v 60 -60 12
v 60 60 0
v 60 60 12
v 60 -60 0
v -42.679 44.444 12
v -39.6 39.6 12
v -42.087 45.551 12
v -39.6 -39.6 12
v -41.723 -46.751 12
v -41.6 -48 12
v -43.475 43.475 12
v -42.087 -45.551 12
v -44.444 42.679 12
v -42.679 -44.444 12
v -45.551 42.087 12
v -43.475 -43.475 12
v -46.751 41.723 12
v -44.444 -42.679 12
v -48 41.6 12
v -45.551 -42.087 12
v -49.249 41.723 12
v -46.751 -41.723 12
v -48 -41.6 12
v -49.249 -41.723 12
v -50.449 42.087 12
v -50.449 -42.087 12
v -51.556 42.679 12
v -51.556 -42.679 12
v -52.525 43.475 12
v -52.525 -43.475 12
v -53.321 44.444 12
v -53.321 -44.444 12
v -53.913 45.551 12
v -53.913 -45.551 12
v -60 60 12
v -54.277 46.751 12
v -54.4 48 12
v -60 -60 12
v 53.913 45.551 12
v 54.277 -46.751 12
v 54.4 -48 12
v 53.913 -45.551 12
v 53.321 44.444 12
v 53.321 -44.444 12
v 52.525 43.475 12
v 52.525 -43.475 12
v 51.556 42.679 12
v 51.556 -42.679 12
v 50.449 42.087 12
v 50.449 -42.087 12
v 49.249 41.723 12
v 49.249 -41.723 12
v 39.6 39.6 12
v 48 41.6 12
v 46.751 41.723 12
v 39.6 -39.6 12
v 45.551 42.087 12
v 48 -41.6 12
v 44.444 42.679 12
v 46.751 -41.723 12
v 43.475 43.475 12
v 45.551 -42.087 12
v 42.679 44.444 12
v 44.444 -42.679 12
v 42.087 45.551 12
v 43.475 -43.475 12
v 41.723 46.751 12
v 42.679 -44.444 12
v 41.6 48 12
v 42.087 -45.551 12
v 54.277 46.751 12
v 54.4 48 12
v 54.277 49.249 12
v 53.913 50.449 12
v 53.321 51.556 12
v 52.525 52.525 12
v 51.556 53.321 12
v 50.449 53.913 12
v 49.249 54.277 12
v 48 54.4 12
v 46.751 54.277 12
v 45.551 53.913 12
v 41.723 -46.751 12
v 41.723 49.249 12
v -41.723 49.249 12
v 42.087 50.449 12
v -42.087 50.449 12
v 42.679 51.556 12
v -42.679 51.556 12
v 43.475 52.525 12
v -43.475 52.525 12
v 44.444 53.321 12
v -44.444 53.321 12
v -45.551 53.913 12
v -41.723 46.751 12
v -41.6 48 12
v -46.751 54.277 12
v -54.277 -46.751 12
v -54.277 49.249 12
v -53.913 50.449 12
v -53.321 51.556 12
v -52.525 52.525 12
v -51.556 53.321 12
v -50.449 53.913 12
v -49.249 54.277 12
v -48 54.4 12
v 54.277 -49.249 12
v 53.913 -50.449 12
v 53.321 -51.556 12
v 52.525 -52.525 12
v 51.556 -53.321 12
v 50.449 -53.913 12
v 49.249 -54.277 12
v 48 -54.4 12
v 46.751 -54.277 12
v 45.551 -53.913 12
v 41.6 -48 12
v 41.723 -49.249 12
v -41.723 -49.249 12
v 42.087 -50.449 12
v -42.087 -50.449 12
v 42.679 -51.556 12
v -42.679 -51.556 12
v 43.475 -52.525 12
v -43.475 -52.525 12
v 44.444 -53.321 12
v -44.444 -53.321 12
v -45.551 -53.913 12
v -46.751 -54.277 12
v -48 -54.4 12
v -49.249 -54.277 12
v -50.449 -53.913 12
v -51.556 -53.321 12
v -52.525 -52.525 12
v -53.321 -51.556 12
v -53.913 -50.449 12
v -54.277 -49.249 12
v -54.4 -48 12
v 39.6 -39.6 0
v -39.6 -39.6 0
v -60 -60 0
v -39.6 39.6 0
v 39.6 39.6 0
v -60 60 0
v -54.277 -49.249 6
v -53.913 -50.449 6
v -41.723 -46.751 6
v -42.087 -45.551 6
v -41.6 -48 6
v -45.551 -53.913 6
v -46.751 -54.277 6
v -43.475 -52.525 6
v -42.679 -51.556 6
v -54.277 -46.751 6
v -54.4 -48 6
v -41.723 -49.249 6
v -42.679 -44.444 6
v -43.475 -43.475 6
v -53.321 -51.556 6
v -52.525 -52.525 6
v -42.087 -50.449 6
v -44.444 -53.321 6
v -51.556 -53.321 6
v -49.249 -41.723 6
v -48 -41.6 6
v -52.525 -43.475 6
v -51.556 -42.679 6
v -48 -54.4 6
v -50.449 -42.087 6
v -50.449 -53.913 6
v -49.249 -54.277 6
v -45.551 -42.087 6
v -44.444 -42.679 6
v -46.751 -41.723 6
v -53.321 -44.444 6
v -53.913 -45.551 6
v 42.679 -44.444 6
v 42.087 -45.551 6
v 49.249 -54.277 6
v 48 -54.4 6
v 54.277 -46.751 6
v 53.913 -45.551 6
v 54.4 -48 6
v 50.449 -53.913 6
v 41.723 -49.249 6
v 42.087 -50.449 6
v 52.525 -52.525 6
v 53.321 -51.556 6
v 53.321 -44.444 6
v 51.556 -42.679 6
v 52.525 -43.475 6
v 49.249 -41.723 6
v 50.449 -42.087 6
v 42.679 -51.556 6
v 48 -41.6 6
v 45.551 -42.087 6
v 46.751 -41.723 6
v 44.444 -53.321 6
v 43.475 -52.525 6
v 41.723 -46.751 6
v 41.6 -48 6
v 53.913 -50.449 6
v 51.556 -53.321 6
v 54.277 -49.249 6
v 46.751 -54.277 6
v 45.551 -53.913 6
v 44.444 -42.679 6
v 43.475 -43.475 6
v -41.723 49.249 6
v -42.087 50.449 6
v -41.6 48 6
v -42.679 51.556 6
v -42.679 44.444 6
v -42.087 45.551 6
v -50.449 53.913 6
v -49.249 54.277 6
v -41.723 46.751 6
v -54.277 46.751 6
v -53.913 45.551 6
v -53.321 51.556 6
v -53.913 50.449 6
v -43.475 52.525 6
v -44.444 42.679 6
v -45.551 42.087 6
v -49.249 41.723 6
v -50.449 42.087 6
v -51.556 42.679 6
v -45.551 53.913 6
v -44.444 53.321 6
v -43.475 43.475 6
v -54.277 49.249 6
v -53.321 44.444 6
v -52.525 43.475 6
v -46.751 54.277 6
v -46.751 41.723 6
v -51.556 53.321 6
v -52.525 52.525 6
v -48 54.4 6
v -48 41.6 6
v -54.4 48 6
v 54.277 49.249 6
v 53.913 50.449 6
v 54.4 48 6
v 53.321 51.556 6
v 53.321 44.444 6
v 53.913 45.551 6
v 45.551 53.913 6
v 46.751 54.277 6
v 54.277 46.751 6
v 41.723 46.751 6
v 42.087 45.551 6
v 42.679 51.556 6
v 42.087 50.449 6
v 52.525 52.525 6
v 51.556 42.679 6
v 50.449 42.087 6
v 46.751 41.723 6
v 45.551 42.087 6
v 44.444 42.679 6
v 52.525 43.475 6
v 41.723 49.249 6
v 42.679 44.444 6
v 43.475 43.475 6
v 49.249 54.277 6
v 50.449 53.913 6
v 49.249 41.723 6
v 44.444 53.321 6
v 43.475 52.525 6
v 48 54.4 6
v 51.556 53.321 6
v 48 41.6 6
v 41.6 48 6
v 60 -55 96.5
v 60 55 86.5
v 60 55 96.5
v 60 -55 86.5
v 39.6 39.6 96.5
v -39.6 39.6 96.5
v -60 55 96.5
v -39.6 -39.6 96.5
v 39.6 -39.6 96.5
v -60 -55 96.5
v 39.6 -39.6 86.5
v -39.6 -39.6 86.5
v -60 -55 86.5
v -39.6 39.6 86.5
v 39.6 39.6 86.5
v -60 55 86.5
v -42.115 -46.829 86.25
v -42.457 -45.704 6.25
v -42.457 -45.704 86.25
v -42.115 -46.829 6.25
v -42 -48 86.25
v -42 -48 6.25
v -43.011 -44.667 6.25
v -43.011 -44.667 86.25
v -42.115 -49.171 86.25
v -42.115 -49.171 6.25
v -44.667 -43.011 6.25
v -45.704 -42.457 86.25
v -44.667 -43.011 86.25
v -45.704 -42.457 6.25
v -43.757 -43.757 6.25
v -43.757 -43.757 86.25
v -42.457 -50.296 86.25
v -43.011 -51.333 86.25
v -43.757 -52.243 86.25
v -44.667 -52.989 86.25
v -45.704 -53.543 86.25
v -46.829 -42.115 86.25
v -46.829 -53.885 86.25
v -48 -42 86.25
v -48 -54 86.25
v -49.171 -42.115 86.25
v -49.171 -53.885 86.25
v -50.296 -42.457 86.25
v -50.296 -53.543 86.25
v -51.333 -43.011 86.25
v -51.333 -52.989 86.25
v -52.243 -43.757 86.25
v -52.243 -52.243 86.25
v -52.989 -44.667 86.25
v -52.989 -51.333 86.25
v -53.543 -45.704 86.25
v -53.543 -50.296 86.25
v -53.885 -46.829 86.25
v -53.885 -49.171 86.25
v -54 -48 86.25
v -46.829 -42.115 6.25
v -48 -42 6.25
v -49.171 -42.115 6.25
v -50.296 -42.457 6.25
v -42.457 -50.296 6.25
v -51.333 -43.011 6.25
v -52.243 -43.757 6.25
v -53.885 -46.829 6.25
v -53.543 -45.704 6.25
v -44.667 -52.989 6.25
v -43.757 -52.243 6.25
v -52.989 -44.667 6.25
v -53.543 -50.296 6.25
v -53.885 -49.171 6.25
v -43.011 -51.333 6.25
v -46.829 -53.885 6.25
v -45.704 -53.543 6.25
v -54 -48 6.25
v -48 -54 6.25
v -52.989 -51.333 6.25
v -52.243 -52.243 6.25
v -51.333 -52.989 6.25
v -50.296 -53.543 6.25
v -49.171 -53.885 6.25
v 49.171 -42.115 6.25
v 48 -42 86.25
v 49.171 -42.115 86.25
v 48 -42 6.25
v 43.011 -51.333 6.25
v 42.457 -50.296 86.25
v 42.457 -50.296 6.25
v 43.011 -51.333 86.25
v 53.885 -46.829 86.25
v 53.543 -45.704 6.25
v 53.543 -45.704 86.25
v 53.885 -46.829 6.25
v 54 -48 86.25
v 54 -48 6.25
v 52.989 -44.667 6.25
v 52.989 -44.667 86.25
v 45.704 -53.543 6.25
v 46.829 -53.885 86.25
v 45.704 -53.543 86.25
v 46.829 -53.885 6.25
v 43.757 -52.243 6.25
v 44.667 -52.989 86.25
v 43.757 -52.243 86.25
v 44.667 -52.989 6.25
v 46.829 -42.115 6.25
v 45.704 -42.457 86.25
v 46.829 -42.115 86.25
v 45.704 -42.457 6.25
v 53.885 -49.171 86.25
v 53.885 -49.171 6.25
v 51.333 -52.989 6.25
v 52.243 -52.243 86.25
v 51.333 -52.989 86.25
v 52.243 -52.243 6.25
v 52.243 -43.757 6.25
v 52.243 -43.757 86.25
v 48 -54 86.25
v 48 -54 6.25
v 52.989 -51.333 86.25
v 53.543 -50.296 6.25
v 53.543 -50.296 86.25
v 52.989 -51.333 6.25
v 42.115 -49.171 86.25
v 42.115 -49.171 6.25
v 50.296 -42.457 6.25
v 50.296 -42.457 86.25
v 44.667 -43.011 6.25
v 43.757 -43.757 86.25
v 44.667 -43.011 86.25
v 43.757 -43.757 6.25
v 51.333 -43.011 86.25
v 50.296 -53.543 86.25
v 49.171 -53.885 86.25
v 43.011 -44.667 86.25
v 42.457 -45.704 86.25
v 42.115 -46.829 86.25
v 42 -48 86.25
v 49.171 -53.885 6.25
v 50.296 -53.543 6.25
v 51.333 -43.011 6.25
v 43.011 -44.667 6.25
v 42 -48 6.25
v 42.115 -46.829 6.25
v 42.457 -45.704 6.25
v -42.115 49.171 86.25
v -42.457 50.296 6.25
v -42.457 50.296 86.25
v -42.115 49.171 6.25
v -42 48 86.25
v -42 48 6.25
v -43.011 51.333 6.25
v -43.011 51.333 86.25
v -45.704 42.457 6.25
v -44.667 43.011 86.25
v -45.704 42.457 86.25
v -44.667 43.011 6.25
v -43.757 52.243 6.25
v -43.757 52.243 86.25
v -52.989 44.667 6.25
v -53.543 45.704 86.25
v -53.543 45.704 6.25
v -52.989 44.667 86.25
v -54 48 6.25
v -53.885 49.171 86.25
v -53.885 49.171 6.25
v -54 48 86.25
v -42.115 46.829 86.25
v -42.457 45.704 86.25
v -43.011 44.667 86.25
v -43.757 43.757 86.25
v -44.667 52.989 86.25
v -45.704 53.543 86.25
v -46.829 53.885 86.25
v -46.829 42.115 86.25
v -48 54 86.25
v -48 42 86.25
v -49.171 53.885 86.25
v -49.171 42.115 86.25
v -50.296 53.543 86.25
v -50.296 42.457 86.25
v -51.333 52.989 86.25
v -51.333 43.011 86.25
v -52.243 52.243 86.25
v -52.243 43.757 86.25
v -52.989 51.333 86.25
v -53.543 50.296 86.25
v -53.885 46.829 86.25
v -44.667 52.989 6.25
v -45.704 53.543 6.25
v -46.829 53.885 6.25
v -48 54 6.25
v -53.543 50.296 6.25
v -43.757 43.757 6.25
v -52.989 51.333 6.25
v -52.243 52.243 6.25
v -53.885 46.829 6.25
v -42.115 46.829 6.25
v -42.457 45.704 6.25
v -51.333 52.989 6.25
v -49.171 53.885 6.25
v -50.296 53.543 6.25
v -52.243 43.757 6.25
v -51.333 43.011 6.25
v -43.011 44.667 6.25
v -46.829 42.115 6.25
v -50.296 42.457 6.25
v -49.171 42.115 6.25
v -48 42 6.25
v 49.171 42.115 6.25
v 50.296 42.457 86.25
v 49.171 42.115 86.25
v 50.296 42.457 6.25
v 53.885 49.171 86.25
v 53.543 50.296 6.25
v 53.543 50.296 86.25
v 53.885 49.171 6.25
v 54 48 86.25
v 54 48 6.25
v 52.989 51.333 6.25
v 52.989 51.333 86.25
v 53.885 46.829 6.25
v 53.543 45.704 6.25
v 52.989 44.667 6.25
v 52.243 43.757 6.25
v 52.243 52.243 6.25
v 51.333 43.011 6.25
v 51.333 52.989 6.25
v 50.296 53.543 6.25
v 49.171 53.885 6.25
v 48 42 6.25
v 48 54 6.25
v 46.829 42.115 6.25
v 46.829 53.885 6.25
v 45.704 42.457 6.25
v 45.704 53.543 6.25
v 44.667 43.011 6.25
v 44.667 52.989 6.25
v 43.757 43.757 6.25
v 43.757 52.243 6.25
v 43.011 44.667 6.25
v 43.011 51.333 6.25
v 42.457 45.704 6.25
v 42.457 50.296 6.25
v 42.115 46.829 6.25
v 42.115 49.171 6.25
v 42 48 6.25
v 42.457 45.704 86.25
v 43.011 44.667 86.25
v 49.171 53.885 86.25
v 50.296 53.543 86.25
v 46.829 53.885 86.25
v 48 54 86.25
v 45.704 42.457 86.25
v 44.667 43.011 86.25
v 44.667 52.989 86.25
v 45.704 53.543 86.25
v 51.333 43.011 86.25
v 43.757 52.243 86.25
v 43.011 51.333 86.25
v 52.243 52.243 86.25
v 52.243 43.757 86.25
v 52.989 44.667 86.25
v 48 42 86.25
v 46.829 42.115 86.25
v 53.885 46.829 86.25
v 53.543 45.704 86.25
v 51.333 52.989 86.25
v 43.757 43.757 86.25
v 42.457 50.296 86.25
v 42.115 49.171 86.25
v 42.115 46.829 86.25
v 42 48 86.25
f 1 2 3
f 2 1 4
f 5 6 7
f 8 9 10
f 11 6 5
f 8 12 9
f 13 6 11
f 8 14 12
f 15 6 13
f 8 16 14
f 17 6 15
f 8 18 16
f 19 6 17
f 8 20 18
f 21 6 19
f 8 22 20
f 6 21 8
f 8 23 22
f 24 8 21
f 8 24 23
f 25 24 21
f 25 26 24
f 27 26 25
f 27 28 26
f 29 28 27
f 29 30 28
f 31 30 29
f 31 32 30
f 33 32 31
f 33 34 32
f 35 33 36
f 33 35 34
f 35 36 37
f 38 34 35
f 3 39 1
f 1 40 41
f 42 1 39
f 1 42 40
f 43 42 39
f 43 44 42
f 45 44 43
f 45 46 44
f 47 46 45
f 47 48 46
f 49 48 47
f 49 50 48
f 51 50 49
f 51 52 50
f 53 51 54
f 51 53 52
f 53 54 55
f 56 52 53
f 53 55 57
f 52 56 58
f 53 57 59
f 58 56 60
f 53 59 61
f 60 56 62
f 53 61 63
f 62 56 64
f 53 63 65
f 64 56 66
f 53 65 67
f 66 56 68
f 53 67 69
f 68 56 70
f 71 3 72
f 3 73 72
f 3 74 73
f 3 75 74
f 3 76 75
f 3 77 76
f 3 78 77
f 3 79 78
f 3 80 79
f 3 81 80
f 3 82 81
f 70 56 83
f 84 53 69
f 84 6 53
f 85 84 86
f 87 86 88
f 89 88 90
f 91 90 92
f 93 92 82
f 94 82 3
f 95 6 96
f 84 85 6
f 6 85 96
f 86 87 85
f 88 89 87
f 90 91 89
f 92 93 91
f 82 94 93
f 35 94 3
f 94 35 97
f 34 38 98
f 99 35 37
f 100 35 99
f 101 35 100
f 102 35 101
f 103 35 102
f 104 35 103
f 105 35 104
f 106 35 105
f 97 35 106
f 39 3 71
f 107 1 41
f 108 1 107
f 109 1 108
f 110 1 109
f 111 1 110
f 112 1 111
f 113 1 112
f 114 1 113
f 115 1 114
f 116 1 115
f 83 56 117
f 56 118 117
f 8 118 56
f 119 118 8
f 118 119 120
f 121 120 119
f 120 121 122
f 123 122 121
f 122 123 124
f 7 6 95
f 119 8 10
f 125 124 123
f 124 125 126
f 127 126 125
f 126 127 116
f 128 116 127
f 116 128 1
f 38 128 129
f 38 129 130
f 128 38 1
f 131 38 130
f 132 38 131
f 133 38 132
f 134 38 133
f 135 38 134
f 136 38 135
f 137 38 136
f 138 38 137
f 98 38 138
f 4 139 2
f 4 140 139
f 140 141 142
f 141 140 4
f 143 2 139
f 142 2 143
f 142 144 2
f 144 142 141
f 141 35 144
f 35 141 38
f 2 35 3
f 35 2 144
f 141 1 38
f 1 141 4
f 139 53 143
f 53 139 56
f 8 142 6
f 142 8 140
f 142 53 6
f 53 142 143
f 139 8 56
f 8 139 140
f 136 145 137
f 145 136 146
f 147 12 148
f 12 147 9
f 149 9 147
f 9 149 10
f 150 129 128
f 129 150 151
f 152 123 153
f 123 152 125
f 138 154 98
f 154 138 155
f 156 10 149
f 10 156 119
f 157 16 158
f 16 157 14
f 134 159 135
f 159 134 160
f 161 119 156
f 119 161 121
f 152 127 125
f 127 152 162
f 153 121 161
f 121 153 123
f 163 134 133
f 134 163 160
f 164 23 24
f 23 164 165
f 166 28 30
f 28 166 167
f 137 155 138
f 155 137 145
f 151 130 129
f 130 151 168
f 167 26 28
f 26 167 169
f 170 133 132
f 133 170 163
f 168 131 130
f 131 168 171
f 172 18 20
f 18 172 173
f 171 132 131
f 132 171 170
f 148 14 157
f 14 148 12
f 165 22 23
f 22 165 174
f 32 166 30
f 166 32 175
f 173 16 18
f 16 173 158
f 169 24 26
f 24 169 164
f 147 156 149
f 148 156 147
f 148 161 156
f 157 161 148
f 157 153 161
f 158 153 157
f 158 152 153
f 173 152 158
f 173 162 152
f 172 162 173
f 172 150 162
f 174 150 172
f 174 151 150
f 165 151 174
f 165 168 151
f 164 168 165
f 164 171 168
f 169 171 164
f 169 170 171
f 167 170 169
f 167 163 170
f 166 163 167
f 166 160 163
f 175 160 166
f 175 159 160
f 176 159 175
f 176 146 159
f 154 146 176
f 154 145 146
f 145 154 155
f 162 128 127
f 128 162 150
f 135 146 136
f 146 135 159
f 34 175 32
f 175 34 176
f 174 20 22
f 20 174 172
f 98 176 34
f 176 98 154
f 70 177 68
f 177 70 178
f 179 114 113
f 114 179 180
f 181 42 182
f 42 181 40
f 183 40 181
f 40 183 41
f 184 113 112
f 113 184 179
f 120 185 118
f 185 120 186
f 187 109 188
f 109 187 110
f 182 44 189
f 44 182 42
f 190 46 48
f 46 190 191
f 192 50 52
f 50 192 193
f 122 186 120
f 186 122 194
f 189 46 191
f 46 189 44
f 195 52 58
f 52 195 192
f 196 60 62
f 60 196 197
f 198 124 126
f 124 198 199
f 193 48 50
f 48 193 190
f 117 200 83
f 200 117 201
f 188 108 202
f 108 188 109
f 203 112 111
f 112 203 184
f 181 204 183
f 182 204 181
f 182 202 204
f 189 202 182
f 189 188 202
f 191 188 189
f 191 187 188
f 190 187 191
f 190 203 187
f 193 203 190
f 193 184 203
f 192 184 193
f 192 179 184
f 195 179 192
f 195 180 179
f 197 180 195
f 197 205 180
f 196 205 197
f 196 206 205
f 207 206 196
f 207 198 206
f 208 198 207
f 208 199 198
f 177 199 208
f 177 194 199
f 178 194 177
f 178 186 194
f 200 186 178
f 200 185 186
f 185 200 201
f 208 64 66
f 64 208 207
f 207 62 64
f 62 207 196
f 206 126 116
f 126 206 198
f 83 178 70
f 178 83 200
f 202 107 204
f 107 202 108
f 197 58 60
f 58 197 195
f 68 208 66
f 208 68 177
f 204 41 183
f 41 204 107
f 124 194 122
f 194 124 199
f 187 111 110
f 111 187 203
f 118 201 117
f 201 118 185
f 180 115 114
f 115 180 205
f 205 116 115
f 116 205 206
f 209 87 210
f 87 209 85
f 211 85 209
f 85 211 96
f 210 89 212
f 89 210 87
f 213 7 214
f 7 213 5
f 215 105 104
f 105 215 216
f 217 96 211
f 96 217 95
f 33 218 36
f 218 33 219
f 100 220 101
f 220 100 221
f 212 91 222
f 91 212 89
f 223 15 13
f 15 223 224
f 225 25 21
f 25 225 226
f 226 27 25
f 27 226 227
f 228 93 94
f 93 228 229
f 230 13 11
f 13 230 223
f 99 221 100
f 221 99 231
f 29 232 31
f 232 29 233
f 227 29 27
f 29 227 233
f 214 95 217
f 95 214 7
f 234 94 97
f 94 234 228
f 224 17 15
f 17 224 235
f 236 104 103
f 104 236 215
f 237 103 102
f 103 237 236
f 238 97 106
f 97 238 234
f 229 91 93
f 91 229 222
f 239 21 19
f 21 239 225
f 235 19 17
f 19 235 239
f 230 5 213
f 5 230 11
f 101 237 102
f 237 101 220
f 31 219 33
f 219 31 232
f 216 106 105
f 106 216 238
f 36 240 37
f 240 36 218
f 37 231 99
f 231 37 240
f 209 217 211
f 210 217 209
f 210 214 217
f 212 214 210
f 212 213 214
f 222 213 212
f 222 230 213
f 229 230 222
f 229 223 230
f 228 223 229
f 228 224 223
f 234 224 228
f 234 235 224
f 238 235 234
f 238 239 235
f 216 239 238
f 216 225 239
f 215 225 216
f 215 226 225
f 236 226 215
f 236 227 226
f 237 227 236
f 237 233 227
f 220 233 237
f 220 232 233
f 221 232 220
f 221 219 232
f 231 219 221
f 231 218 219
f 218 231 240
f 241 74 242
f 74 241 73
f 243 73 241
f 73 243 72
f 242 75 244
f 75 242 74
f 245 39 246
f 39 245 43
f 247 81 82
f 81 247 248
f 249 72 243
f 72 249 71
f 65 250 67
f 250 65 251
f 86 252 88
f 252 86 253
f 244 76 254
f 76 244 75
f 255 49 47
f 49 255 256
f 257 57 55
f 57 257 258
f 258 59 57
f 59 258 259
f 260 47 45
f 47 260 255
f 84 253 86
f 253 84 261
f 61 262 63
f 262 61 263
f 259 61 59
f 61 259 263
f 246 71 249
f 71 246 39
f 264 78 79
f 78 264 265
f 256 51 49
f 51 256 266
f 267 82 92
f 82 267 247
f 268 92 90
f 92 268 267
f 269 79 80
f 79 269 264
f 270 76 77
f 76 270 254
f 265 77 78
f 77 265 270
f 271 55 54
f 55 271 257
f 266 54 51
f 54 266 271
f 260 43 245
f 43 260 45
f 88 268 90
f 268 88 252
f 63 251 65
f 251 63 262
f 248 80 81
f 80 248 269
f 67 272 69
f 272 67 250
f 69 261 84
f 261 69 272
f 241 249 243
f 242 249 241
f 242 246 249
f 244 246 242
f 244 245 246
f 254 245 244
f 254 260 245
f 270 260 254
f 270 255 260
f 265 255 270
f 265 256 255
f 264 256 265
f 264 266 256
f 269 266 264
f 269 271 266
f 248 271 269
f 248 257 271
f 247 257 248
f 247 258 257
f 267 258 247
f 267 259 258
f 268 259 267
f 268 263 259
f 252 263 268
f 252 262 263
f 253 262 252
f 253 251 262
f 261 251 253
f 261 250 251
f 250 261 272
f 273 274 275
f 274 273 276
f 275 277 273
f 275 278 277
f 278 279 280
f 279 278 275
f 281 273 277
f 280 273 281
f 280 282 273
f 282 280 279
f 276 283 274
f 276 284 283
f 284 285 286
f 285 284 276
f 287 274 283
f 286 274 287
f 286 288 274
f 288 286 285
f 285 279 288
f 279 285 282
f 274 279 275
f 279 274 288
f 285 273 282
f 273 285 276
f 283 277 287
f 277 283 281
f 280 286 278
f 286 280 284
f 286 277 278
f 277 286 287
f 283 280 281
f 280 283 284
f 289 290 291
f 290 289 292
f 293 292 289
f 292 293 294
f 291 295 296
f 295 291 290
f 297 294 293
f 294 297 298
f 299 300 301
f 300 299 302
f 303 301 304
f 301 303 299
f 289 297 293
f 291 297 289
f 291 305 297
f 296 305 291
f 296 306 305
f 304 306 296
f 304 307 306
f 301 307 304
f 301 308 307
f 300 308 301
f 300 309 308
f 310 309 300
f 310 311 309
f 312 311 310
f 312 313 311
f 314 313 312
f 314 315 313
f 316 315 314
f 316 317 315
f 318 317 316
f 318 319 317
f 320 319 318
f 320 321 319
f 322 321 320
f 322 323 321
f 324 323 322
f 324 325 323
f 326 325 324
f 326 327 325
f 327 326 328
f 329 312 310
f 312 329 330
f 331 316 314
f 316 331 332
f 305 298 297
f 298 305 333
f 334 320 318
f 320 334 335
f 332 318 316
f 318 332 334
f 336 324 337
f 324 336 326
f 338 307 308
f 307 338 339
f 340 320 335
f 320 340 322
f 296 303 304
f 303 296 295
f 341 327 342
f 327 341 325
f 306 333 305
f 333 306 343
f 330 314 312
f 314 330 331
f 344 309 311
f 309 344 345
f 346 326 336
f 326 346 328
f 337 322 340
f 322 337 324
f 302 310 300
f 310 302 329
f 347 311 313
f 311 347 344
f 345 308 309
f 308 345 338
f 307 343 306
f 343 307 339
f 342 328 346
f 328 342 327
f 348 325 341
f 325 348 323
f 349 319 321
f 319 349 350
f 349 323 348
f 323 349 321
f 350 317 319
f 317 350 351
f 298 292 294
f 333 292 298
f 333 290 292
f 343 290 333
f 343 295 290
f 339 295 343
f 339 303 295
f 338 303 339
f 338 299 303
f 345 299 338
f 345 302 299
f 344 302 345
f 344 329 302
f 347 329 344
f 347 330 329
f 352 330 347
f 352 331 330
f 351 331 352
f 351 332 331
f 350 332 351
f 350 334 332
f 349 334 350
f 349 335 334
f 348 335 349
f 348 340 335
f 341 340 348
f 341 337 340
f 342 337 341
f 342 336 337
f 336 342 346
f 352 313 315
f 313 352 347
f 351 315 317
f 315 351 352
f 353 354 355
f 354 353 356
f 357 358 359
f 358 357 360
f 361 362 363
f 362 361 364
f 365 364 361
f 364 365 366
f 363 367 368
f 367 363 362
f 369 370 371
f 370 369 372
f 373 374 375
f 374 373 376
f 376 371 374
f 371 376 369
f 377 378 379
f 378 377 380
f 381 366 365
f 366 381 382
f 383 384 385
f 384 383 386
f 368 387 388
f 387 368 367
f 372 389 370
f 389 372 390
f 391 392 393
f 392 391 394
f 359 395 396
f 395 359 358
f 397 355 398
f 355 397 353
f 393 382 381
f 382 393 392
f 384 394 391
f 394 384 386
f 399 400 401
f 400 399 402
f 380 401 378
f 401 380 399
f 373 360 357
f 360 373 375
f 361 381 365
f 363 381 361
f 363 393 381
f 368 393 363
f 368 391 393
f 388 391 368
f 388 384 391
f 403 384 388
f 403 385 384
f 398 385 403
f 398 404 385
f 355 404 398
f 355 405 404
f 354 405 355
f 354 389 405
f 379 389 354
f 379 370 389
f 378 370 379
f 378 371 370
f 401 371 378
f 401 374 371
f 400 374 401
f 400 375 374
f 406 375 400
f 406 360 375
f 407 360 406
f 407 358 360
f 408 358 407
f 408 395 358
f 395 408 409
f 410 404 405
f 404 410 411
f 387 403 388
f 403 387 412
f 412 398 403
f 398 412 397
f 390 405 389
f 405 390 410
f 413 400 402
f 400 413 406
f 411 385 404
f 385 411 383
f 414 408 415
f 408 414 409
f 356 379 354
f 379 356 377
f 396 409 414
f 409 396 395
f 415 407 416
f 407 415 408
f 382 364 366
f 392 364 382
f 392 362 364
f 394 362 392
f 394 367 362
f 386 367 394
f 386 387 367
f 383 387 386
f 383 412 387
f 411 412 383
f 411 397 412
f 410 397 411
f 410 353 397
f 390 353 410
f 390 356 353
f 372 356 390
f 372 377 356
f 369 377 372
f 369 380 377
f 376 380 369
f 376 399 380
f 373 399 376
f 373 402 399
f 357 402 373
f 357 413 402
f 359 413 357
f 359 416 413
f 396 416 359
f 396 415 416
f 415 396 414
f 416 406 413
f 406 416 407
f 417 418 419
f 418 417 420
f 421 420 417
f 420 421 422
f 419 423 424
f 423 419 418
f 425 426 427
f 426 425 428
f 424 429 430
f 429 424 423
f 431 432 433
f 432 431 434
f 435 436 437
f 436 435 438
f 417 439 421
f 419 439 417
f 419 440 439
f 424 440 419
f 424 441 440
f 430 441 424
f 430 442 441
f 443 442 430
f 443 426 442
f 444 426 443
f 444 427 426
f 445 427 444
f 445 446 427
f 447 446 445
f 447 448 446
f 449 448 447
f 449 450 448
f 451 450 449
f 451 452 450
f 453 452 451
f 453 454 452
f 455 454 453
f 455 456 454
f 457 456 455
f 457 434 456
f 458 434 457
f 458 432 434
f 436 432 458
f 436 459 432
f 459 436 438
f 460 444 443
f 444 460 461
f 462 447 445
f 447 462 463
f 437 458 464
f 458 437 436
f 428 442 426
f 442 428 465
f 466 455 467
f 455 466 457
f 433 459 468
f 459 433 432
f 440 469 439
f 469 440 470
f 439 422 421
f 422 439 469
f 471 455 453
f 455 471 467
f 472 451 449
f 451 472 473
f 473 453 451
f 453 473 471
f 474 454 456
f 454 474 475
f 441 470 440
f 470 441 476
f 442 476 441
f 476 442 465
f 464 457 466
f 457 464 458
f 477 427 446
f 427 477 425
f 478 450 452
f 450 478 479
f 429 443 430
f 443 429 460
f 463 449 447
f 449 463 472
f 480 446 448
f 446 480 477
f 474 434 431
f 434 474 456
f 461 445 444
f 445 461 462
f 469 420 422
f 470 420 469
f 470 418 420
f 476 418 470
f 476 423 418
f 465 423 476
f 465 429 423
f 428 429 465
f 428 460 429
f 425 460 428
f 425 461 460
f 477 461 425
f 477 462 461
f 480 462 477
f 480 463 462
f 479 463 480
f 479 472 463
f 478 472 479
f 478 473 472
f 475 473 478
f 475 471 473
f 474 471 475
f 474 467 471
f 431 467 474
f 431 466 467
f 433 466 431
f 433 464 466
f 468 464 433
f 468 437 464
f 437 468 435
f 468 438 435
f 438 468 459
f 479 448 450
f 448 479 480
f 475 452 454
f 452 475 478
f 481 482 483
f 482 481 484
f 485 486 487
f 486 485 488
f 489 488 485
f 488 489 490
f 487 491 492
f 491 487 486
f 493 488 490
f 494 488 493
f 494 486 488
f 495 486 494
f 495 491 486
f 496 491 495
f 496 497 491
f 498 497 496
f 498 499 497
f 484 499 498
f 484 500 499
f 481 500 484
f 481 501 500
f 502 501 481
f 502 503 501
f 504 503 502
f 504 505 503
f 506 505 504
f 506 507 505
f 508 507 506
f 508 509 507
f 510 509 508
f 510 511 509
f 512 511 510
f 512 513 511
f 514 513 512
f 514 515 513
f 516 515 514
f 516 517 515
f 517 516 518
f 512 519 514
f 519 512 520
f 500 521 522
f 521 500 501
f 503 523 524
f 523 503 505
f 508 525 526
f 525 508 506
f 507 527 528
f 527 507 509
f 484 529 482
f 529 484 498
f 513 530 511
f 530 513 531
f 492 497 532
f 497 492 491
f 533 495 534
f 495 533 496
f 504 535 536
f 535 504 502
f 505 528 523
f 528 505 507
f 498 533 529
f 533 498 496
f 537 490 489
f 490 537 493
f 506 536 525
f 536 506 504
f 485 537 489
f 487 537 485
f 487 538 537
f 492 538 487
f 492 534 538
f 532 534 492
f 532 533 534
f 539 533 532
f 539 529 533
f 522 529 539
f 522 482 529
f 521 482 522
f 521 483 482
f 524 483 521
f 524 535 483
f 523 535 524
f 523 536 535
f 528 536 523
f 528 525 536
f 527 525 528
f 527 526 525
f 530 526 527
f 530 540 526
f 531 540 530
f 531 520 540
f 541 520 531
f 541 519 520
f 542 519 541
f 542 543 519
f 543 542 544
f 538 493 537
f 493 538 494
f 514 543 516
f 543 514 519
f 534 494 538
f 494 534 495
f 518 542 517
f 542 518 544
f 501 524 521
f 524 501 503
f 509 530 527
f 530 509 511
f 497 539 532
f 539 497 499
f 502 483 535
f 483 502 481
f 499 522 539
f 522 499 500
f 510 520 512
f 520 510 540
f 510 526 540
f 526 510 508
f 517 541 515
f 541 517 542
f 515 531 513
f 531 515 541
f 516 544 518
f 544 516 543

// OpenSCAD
$fn = 32;

// ------------------------------------------------------------------------
// Frame cube: base 120 x 120 mm, posts 80 mm tall
// Every part is its own module, assembly() places every instance.
// ------------------------------------------------------------------------

// --- part 1 ---
module base_frame() {
  difference() {
    translate([-60, -60, 0]) cube([120, 120, 12]);
    translate([-39.6, -39.6, -1]) cube([79.2, 79.2, 14]);
    translate([-48, -48, 6]) cylinder(h = 7, d = 12.8);
    translate([48, -48, 6]) cylinder(h = 7, d = 12.8);
    translate([-48, 48, 6]) cylinder(h = 7, d = 12.8);
    translate([48, 48, 6]) cylinder(h = 7, d = 12.8);
  }
}

// --- part 2 ---
module corner_post() {
  cylinder(h = 80, d = 12);
}

// --- part 3 ---
module top_frame() {
  difference() {
    translate([-60, -55, 0]) cube([120, 110, 10]);
    translate([-39.6, -39.6, -1]) cube([79.2, 79.2, 12]);
  }
}

// --- assembly ---
module assembly() {
  color([0.80, 0.24, 0.20]) translate([0, 0, 0]) rotate([0, 0, 0]) base_frame();
  color([0.20, 0.45, 0.75]) translate([-48, -48, 6.25]) rotate([0, 0, 0]) corner_post();
  color([0.25, 0.62, 0.32]) translate([48, -48, 6.25]) rotate([0, 0, 0]) corner_post();
  color([0.92, 0.70, 0.18]) translate([-48, 48, 6.25]) rotate([0, 0, 0]) corner_post();
  color([0.58, 0.35, 0.70]) translate([48, 48, 6.25]) rotate([0, 0, 0]) corner_post();
  color([0.16, 0.66, 0.66]) translate([0, 0, 86.5]) rotate([0, 0, 0]) top_frame();
}

assembly();
